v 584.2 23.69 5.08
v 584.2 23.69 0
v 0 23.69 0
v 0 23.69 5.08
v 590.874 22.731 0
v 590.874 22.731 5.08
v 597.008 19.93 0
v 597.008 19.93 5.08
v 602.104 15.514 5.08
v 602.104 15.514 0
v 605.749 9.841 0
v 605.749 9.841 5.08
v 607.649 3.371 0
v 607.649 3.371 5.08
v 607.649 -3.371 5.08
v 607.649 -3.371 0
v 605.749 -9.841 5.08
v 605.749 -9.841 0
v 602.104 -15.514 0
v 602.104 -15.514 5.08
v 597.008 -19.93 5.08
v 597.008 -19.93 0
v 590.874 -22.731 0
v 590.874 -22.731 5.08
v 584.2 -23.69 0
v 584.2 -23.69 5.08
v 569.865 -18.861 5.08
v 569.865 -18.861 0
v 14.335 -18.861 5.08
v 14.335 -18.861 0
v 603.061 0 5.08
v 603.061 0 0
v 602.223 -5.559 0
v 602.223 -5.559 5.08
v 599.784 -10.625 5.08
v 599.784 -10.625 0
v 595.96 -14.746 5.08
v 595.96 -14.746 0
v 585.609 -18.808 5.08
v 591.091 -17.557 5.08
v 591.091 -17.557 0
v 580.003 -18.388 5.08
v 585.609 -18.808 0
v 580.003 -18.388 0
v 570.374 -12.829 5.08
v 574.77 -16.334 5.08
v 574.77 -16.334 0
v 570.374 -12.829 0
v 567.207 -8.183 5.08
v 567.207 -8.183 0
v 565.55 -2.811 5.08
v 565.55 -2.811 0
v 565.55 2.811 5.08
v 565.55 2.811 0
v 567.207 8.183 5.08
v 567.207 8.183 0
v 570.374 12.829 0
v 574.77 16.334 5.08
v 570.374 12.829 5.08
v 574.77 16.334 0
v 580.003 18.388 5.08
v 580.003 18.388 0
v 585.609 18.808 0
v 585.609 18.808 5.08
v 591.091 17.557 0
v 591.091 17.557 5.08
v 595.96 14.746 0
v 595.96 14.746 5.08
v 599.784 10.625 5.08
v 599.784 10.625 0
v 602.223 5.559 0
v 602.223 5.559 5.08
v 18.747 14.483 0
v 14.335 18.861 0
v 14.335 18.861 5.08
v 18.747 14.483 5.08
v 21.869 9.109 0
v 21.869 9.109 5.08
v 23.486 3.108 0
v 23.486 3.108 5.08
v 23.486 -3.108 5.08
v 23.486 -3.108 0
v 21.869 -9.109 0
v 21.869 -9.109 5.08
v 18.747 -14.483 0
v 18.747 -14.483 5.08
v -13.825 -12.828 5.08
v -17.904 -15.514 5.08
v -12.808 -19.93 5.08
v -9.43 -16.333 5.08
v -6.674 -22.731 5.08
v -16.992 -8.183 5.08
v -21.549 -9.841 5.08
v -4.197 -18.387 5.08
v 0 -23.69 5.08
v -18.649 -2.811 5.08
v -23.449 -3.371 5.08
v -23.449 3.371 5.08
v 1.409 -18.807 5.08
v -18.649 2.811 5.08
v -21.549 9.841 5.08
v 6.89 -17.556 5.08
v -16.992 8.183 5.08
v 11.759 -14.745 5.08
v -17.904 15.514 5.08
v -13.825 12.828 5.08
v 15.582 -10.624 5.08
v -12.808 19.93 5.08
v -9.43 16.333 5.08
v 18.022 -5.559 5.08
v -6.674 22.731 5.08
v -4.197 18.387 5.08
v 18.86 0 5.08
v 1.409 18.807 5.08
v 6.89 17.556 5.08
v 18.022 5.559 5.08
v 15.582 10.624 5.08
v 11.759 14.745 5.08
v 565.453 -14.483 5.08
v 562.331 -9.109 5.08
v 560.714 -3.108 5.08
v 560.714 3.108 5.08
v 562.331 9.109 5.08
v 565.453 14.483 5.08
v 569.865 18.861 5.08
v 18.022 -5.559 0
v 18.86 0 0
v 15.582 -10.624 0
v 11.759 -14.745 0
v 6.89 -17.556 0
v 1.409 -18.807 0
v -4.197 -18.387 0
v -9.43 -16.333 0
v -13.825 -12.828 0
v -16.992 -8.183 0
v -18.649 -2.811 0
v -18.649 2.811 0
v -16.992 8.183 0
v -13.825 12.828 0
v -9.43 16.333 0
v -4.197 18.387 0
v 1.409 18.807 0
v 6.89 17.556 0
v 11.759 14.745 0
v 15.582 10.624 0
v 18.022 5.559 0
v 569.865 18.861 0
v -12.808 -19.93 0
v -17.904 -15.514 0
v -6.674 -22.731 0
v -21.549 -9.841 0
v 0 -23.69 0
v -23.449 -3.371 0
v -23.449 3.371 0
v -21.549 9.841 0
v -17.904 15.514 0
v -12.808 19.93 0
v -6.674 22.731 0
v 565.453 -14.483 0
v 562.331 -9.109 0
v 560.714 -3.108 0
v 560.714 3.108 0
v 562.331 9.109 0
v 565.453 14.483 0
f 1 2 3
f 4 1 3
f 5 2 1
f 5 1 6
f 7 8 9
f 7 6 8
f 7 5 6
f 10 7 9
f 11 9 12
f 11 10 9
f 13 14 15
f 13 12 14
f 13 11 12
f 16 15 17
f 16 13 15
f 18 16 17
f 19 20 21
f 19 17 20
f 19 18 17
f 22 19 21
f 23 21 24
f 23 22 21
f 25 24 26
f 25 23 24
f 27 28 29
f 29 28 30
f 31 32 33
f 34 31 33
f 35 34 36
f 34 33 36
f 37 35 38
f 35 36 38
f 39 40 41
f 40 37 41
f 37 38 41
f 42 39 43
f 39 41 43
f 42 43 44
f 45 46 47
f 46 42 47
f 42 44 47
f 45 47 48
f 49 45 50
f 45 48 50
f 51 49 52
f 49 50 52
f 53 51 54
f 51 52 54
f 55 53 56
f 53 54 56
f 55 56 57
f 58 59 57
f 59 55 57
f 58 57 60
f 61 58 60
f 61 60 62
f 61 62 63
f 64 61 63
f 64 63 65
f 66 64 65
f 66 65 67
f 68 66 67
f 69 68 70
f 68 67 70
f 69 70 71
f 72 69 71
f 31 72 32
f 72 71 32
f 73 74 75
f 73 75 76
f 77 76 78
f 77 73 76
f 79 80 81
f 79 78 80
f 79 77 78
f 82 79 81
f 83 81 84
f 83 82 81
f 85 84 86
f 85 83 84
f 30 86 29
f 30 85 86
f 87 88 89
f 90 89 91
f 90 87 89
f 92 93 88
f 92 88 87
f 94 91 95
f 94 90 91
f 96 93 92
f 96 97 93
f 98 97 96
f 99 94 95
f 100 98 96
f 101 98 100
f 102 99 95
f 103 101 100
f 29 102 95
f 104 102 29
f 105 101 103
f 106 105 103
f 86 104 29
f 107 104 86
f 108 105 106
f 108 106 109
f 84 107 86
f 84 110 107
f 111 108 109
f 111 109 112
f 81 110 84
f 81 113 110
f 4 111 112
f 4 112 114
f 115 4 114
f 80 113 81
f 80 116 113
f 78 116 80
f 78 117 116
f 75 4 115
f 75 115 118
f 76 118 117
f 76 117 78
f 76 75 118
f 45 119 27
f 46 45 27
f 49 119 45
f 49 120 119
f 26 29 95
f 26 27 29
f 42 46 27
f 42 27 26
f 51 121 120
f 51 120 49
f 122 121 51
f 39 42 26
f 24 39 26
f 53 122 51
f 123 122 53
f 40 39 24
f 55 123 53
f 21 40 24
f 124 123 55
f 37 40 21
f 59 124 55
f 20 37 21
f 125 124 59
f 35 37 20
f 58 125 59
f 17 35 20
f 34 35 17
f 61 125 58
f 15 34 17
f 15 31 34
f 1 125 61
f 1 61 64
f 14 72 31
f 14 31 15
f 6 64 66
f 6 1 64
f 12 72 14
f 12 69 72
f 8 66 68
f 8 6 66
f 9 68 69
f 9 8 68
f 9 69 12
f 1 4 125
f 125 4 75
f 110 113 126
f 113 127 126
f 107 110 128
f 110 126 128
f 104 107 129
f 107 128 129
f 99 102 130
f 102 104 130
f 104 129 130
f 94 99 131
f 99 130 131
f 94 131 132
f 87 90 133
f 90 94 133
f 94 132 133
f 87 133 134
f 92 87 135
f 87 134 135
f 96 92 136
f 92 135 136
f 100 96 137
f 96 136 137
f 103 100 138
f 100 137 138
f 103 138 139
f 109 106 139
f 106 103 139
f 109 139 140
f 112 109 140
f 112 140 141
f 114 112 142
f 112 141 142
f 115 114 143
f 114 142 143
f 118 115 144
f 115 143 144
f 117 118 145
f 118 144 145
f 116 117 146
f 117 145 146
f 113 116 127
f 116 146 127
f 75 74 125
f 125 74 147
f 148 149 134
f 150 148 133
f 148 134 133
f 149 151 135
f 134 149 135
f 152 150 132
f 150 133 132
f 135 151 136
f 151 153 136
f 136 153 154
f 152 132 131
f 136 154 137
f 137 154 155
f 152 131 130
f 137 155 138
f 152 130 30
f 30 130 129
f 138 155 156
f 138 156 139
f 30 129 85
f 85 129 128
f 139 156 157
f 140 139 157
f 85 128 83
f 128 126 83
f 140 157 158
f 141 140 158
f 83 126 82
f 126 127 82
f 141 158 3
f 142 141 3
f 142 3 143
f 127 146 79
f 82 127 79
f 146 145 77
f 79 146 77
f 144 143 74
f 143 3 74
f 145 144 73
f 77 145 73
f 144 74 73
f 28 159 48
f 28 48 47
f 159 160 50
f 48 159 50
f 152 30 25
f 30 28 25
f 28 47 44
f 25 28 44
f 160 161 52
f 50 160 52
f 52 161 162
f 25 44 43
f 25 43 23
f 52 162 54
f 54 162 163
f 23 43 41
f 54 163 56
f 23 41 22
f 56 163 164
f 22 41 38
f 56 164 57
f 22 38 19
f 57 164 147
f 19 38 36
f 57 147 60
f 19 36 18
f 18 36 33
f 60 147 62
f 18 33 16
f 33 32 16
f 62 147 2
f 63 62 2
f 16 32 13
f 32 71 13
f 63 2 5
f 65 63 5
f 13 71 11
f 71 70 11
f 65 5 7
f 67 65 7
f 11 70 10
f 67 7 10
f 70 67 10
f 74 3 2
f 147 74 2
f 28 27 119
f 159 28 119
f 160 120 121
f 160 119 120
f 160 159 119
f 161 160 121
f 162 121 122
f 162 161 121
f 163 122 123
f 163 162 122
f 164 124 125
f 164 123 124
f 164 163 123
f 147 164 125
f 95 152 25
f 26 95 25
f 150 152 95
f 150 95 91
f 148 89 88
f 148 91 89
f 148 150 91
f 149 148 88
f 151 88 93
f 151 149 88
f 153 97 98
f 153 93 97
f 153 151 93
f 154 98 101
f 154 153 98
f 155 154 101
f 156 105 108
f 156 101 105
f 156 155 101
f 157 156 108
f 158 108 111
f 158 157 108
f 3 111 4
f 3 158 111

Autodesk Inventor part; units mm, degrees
ref_plane "YZ Plane" through (0, 0, 0) normal (1, 0, 0) x (0, 1, 0)
ref_plane "XZ Plane" through (0, 0, 0) normal (0, 1, 0) x (-1, 0, 0)
ref_plane "XY Plane" through (0, 0, 0) normal (0, 0, 1) x (1, 0, 0)
sketch "Sketch1" plane through (0, 0, 0) normal (0, 0, 1) x (1, 0, 0)
  circle A0 centre (0, 0) radius 18.8595
  arc A1 (0, 23.6903) -> (0, -23.6903) centre (0, 0) ccw
  circle A2 centre (584.2, 0) radius 18.8608
  arc A3 (569.8648, 18.8608) -> (569.8648, -18.8608) centre (584.2, 0) ccw
  line L0 (584.2, 23.6903) -> (0, 23.6903)
  line L1 (0, -23.6903) -> (584.2, -23.6903)
  line L2 (569.8648, -18.8608) -> (14.3352, -18.8608)
  line L3 (14.3352, 18.8608) -> (569.8648, 18.8608)
  arc A4 (14.3352, -18.8608) -> (14.3352, 18.8608) centre (0, 0) ccw
  arc A5 (584.2, -23.6903) -> (584.2, 23.6903) centre (584.2, 0) ccw
  dimension "d0" = 37.719
extrude "Extrusion1" add sketch "Sketch1" along normal blind 5.08
properties part number "false chain"
